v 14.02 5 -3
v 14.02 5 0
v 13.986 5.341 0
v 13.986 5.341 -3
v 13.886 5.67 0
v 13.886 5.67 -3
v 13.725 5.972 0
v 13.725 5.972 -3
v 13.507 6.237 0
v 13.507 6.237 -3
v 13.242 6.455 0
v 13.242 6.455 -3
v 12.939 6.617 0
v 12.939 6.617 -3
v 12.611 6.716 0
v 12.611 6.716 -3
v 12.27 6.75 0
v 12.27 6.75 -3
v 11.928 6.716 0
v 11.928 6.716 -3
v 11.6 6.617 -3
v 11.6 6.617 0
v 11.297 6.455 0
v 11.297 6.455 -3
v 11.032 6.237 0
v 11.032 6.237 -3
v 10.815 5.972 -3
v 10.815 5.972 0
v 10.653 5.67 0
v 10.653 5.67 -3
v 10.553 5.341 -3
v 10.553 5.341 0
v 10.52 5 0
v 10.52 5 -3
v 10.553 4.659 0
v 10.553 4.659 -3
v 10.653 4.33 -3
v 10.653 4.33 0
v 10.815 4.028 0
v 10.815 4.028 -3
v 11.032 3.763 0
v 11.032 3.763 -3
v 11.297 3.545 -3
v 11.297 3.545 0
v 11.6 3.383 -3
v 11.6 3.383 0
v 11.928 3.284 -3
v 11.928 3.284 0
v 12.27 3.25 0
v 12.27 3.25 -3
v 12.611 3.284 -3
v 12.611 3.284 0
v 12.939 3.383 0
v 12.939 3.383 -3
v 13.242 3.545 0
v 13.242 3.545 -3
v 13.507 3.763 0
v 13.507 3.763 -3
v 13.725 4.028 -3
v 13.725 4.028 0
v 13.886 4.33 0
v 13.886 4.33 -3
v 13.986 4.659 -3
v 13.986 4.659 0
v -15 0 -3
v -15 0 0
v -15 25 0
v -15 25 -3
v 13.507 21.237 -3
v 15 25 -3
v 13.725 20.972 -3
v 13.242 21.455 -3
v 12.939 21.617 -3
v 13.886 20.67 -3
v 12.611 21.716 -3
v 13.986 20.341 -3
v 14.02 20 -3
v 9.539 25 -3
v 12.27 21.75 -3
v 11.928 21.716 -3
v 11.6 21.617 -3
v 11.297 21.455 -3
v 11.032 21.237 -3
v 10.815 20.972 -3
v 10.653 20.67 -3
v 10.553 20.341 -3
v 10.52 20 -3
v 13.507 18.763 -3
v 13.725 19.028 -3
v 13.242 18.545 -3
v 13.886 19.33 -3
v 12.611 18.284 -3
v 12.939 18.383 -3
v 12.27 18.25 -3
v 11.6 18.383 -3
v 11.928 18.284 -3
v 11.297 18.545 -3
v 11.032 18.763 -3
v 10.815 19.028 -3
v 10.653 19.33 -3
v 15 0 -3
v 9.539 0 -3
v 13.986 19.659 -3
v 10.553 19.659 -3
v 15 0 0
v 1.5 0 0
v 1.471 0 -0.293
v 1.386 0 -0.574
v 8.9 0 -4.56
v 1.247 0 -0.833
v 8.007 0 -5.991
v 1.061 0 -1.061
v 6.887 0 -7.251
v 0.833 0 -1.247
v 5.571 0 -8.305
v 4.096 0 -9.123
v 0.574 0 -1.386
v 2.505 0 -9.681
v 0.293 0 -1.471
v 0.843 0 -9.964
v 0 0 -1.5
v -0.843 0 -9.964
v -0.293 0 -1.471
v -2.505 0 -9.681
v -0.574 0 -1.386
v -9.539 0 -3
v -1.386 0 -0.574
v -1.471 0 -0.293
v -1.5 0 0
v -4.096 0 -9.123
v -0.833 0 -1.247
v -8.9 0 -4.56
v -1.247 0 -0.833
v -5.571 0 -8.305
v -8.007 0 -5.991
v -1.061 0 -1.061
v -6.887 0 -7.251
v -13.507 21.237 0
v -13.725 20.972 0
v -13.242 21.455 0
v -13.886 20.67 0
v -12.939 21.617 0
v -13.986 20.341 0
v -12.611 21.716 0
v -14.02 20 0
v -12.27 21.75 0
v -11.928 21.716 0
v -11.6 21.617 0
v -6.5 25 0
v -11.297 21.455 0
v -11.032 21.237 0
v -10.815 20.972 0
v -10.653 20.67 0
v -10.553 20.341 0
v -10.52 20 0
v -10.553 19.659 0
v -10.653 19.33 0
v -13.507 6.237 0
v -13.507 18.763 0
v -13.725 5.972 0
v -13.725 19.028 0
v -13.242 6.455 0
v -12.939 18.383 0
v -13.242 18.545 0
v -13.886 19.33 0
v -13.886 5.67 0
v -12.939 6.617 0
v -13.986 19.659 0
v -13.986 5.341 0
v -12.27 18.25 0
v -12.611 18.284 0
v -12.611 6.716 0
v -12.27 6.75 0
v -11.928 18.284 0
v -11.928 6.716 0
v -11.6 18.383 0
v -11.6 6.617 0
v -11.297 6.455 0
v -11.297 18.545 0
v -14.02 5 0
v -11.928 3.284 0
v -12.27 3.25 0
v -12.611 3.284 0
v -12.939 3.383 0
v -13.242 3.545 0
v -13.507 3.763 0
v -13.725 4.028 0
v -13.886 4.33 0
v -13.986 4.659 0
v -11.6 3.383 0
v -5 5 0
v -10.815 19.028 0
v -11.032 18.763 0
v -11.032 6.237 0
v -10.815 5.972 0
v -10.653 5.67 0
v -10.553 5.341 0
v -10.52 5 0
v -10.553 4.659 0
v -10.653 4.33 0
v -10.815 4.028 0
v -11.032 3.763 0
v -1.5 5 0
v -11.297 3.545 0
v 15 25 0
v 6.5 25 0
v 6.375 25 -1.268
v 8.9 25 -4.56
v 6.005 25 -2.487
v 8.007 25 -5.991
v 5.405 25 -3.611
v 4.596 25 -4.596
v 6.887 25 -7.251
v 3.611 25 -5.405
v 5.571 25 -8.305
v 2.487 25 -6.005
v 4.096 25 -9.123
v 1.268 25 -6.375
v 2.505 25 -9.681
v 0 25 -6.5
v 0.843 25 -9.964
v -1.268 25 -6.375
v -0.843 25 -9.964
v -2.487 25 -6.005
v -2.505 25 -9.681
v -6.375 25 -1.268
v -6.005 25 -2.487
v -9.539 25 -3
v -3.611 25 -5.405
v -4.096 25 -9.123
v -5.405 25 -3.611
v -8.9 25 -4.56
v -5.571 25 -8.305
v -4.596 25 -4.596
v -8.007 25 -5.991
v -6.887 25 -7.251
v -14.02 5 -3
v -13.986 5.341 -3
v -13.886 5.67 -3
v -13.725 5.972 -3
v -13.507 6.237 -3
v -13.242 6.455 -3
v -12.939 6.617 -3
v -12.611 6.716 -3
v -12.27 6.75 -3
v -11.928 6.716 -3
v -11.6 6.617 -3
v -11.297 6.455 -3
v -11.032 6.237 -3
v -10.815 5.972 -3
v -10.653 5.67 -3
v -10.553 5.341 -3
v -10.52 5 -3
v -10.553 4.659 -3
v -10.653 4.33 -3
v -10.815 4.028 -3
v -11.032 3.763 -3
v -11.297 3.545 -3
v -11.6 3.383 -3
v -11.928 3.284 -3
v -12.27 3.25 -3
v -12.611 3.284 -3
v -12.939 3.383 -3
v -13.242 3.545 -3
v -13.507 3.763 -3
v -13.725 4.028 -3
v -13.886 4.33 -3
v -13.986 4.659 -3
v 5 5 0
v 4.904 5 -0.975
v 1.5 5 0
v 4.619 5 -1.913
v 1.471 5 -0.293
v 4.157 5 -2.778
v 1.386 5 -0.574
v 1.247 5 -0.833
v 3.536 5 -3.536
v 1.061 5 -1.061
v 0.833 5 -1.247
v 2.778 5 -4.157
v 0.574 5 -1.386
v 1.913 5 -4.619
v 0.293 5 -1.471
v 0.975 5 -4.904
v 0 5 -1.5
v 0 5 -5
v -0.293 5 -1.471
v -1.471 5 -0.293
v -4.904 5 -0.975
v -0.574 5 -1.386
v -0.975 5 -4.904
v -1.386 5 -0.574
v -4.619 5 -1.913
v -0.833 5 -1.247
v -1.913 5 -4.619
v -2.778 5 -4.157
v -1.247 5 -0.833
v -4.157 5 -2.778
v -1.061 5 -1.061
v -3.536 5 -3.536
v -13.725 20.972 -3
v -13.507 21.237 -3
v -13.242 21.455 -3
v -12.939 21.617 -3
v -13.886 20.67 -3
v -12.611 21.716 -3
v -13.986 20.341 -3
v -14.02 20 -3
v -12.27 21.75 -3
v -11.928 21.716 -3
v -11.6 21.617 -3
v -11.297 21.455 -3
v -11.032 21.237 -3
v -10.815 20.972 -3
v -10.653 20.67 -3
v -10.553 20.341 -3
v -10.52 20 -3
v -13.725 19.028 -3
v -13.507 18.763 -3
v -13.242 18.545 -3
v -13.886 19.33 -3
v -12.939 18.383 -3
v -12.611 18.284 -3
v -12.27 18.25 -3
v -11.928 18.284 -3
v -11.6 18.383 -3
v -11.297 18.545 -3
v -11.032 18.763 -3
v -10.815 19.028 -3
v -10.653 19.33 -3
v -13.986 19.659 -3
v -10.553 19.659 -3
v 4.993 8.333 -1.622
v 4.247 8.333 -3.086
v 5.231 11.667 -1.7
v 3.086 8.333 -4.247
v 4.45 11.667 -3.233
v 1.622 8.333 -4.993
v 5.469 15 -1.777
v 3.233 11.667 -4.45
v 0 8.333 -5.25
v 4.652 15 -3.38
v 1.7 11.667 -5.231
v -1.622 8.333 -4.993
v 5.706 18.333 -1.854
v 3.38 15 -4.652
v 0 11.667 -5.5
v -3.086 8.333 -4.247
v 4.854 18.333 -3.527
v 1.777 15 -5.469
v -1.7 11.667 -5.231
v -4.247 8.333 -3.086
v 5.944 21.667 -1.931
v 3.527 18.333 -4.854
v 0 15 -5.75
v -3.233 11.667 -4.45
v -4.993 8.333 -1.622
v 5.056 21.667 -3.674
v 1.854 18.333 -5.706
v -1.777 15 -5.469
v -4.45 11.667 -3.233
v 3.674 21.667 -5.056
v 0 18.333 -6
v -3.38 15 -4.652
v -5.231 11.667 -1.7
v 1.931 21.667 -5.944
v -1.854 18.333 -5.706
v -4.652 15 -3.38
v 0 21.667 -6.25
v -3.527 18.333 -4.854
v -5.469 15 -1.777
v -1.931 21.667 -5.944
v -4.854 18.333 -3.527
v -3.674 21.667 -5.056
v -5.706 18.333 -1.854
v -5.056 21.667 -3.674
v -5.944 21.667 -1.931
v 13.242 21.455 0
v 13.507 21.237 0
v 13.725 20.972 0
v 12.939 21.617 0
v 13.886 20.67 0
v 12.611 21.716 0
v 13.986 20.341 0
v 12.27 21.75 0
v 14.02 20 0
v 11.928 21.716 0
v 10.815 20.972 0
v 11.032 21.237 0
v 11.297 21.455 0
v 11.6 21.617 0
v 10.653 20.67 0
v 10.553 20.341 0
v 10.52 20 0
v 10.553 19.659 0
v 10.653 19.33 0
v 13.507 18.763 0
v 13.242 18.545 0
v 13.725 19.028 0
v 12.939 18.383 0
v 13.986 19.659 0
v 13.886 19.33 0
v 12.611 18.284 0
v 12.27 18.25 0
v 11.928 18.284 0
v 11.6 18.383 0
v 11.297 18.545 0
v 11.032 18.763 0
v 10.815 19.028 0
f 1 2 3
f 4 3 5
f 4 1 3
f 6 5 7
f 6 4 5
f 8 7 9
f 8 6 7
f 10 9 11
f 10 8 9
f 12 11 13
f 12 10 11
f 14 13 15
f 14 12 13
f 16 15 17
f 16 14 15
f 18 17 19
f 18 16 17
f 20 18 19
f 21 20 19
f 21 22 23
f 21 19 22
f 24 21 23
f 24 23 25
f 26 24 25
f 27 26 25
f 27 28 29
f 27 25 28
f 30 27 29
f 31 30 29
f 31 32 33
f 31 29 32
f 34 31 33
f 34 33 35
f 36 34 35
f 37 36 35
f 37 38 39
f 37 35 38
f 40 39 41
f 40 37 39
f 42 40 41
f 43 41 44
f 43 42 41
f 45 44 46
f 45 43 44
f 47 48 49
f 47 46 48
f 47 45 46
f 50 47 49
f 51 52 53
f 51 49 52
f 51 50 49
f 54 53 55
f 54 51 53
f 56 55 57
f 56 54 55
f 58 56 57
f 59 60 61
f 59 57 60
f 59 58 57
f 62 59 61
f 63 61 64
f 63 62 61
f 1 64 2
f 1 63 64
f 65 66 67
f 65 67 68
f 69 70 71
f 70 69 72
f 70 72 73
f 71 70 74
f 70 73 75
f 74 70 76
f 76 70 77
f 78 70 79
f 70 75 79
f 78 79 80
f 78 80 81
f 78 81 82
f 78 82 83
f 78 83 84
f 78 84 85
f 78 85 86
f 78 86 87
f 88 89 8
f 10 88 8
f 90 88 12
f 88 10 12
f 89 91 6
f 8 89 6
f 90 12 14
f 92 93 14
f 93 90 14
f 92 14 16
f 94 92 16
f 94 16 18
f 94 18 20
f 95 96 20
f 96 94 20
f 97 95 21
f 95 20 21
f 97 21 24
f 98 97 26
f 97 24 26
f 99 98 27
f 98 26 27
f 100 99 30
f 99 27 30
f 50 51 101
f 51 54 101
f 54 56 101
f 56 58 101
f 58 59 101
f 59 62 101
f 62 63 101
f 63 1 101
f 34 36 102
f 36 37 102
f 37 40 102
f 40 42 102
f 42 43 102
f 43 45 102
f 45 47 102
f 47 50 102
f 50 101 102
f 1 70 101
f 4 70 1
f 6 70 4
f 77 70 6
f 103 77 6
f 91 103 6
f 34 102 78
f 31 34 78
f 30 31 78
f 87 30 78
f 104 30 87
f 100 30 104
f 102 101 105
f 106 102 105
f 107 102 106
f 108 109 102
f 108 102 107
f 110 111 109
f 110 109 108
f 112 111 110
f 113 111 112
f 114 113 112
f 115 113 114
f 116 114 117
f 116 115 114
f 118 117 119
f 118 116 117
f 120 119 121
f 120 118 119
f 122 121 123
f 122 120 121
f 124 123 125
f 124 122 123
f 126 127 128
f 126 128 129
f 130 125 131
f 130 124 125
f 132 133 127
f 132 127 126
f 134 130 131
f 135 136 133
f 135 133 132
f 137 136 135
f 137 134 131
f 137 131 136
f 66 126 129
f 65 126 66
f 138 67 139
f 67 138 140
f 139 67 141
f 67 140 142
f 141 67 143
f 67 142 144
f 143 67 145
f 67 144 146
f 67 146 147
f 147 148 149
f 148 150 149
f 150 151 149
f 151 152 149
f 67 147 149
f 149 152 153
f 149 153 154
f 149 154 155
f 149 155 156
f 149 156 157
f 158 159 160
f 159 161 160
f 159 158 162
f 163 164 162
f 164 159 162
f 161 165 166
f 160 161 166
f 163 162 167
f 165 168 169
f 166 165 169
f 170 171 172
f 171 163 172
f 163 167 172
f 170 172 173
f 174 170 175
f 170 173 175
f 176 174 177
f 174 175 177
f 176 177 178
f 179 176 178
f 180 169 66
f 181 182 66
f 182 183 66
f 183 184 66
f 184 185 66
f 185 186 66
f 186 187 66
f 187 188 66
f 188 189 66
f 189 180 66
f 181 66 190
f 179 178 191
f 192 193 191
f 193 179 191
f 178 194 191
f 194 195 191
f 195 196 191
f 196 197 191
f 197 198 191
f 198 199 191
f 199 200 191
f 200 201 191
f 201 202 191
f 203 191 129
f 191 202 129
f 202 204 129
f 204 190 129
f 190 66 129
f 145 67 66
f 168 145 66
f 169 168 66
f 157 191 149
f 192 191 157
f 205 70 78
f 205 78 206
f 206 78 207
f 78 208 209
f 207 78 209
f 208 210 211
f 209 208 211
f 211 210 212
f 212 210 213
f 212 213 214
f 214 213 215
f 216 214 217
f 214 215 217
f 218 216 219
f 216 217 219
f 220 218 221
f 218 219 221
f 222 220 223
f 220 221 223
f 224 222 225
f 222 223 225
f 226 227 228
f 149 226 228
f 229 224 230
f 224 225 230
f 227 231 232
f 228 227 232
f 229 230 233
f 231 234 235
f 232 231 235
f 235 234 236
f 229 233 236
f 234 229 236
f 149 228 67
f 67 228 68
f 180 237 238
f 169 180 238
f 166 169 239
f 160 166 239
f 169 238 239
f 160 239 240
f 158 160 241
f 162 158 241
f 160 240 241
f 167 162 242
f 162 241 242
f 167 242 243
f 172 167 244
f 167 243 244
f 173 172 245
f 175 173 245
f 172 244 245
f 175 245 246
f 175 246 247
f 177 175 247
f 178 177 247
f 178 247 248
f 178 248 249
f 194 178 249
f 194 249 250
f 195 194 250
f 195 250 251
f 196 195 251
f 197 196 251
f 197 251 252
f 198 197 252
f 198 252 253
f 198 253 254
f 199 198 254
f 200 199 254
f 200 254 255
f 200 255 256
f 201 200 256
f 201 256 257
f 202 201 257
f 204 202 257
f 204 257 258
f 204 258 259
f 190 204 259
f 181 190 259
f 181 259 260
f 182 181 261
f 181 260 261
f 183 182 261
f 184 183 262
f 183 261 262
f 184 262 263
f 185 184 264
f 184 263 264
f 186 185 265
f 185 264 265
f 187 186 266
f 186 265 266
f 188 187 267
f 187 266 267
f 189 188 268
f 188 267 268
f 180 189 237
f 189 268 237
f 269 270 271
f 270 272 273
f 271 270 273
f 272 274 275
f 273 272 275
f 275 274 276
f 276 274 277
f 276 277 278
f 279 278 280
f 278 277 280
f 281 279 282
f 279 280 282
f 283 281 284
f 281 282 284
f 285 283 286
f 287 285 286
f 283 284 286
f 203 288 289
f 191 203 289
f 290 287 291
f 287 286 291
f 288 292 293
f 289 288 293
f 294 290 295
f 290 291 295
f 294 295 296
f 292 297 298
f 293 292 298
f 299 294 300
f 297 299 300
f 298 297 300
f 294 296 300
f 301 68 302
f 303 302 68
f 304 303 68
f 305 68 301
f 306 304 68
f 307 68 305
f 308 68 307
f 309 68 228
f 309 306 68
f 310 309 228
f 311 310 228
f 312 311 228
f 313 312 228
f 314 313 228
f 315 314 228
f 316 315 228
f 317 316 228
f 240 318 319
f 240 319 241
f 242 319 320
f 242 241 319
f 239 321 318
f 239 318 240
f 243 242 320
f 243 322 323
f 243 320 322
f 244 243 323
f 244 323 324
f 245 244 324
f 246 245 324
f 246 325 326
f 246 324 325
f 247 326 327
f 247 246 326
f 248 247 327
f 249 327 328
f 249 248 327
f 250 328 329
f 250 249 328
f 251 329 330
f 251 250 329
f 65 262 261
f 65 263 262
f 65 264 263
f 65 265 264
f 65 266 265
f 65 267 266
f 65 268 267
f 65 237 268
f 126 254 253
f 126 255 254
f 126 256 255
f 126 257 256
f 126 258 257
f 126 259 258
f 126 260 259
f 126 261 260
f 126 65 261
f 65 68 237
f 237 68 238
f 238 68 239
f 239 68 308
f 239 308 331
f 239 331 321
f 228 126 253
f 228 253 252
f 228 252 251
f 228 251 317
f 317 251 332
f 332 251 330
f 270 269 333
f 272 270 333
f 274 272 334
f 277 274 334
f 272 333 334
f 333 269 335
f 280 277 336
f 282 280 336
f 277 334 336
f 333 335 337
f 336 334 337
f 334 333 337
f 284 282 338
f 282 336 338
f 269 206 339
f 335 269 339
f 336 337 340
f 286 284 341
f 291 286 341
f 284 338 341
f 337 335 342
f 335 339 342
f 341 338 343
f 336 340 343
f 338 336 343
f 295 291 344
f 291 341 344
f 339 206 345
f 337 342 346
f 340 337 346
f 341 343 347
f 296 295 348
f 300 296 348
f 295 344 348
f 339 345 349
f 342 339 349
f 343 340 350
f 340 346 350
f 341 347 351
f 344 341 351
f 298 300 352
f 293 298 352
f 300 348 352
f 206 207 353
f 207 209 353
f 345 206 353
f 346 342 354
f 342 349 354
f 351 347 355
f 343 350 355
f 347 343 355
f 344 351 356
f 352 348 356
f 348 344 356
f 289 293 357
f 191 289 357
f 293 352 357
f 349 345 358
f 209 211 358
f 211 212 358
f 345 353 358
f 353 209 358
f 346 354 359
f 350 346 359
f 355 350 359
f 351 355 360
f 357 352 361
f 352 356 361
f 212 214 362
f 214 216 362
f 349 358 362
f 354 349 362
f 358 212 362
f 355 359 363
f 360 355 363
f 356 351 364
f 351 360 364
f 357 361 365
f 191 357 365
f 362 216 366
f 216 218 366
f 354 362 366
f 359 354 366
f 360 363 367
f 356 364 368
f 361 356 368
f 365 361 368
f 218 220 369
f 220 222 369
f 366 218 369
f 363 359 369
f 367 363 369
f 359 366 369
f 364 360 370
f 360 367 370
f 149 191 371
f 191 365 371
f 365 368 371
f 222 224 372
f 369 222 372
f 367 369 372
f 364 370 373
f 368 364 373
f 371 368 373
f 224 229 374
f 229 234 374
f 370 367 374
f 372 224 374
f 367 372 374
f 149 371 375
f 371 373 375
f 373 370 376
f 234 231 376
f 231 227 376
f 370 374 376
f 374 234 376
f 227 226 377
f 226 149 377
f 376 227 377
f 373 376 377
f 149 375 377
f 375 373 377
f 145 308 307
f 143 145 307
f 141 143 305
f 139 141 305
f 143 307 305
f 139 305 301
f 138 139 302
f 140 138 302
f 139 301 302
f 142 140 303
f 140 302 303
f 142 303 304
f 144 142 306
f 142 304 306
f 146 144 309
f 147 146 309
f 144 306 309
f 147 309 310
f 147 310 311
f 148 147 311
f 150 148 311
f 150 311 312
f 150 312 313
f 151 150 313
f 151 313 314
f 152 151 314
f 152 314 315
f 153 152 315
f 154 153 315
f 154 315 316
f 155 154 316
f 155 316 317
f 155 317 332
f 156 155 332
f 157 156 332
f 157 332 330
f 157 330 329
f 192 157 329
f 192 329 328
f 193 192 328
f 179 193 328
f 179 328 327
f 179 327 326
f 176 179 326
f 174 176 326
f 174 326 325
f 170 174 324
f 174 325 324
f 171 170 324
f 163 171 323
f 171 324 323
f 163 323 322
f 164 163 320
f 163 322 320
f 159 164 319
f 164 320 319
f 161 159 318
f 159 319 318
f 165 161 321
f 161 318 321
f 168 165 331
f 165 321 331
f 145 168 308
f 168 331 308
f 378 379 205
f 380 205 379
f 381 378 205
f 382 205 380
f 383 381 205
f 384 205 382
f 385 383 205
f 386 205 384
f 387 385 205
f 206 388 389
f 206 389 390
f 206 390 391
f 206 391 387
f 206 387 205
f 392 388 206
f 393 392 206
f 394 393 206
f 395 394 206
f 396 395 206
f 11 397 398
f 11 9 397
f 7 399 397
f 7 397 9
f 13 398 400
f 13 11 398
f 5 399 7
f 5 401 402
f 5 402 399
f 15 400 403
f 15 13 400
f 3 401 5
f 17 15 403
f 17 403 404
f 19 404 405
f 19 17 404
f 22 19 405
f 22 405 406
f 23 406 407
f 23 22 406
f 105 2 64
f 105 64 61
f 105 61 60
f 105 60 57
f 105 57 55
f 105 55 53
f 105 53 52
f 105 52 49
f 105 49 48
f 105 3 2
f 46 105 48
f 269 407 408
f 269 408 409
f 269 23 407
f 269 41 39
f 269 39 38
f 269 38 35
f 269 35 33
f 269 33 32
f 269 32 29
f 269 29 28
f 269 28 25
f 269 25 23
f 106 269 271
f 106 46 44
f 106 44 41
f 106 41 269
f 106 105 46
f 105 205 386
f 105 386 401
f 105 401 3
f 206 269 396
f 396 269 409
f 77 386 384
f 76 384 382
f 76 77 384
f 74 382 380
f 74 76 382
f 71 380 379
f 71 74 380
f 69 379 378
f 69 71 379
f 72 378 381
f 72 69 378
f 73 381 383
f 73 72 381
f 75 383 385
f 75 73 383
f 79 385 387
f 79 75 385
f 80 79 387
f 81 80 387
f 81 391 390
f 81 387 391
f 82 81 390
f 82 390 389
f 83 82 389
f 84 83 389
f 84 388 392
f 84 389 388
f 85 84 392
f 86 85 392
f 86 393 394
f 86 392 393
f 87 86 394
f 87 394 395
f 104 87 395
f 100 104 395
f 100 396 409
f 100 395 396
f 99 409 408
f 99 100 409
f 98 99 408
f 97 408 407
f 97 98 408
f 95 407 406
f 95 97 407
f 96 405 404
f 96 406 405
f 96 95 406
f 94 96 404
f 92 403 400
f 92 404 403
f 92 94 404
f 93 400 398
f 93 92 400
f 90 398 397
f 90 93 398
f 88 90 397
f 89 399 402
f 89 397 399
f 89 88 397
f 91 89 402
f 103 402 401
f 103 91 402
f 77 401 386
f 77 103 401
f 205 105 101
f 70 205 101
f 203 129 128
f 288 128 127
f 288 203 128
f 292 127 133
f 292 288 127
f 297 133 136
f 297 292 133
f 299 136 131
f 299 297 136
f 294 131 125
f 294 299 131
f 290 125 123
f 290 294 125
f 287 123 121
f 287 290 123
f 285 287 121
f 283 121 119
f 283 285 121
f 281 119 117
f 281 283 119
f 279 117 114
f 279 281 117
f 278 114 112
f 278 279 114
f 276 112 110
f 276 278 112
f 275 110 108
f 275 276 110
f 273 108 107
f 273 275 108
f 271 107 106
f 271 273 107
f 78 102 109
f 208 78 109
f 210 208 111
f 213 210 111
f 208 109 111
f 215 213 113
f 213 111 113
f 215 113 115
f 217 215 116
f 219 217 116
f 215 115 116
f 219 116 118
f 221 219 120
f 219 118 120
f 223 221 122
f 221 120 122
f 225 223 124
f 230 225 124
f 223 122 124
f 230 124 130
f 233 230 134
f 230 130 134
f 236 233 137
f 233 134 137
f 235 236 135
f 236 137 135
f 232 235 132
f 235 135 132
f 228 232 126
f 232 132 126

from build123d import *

# Parameters (mm, degrees)
SKETCH1_R           = 10
BOSS_EXTRUDE1_DEPTH = 25
SKETCH4_R           = 1.5
BOSS_EXTRUDE2_DEPTH = 20
CUT_EXTRUDE2_DEPTH  = 29.722813233
SKETCH6_W           = 6.24870068
SKETCH6_H           = 3
BOSS_EXTRUDE3_DEPTH = 25
SKETCH7_R           = 1.75
CUT_EXTRUDE3_DEPTH  = 30.983328701


# Read off the part's stored shape, not the designer's step: Boundary-Cut1
with BuildPart() as part:
    # Sketch1 → Boss-Extrude1 (new body)
    with BuildSketch(Plane(origin=(0, 0, 0), x_dir=(1, 0, 0), z_dir=(0, 1, 0))):
        with Locations(Location((0, 0, 0), (0, 0, 270))):
            Circle(SKETCH1_R)
    extrude(amount=BOSS_EXTRUDE1_DEPTH)

    # Boundary-Cut1 outline → Boundary-Cut1 (revolve, cut)
    with BuildSketch(Plane.XY):
        Polygon((0, 5), (5, 5), (6.5, 25), (0, 25), align=None)
    revolve(axis=Axis((0, 0, 0), (0, 1, 0)), mode=Mode.SUBTRACT)

    # Sketch4 → Boss-Extrude2 (add)
    with BuildSketch(Plane(origin=(0, 5, 0), x_dir=(1, 0, 0), z_dir=(0, 1, 0))):
        with Locations(Location((0, 0, 0), (0, 0, 90))):
            Circle(SKETCH4_R)
    extrude(amount=BOSS_EXTRUDE2_DEPTH)

    # Sketch5 → Cut-Extrude2 (cut, through all)
    with BuildSketch(Plane(origin=(0, 25, 0), x_dir=(1, 0, 0), z_dir=(0, 1, 0))):
        with BuildLine():
            Line((-10, 0), (-1.5, 0))
            ThreePointArc((-1.5, 0), (0, 1.5), (1.5, 0))
            Line((1.5, 0), (10, 0))
            ThreePointArc((10, 0), (0, -10), (-10, 0))
        make_face()
    extrude(amount=-CUT_EXTRUDE2_DEPTH, mode=Mode.SUBTRACT)

    # Sketch6 → Boss-Extrude3 (add)
    with BuildSketch(Plane(origin=(0, 0, 0), x_dir=(1, 0, 0), z_dir=(0, 1, 0))):
        with Locations((-11.87564966, 1.5)):
            Rectangle(SKETCH6_W, SKETCH6_H)
    boss_extrude3 = extrude(amount=BOSS_EXTRUDE3_DEPTH)

    # Sketch7 → Cut-Extrude3 (cut, through all)
    with BuildSketch(Plane(origin=(0, 0, -3), x_dir=(-1, 0, 0), z_dir=(0, 0, -1))):
        with Locations((12.269696007, 5)):
            Circle(SKETCH7_R)
        with Locations((12.269696007, 20)):
            Circle(SKETCH7_R)
    cut_extrude3 = extrude(amount=-CUT_EXTRUDE3_DEPTH, mode=Mode.SUBTRACT)

    # Mirror1: Boss-Extrude3, Cut-Extrude3 across plane
    add(boss_extrude3.mirror(Plane(origin=(0, 0, 0), x_dir=(0, 0, 1), z_dir=(1, 0, 0))))
    add(cut_extrude3.mirror(Plane(origin=(0, 0, 0), x_dir=(0, 0, 1), z_dir=(1, 0, 0))), mode=Mode.SUBTRACT)


solid = part.part
